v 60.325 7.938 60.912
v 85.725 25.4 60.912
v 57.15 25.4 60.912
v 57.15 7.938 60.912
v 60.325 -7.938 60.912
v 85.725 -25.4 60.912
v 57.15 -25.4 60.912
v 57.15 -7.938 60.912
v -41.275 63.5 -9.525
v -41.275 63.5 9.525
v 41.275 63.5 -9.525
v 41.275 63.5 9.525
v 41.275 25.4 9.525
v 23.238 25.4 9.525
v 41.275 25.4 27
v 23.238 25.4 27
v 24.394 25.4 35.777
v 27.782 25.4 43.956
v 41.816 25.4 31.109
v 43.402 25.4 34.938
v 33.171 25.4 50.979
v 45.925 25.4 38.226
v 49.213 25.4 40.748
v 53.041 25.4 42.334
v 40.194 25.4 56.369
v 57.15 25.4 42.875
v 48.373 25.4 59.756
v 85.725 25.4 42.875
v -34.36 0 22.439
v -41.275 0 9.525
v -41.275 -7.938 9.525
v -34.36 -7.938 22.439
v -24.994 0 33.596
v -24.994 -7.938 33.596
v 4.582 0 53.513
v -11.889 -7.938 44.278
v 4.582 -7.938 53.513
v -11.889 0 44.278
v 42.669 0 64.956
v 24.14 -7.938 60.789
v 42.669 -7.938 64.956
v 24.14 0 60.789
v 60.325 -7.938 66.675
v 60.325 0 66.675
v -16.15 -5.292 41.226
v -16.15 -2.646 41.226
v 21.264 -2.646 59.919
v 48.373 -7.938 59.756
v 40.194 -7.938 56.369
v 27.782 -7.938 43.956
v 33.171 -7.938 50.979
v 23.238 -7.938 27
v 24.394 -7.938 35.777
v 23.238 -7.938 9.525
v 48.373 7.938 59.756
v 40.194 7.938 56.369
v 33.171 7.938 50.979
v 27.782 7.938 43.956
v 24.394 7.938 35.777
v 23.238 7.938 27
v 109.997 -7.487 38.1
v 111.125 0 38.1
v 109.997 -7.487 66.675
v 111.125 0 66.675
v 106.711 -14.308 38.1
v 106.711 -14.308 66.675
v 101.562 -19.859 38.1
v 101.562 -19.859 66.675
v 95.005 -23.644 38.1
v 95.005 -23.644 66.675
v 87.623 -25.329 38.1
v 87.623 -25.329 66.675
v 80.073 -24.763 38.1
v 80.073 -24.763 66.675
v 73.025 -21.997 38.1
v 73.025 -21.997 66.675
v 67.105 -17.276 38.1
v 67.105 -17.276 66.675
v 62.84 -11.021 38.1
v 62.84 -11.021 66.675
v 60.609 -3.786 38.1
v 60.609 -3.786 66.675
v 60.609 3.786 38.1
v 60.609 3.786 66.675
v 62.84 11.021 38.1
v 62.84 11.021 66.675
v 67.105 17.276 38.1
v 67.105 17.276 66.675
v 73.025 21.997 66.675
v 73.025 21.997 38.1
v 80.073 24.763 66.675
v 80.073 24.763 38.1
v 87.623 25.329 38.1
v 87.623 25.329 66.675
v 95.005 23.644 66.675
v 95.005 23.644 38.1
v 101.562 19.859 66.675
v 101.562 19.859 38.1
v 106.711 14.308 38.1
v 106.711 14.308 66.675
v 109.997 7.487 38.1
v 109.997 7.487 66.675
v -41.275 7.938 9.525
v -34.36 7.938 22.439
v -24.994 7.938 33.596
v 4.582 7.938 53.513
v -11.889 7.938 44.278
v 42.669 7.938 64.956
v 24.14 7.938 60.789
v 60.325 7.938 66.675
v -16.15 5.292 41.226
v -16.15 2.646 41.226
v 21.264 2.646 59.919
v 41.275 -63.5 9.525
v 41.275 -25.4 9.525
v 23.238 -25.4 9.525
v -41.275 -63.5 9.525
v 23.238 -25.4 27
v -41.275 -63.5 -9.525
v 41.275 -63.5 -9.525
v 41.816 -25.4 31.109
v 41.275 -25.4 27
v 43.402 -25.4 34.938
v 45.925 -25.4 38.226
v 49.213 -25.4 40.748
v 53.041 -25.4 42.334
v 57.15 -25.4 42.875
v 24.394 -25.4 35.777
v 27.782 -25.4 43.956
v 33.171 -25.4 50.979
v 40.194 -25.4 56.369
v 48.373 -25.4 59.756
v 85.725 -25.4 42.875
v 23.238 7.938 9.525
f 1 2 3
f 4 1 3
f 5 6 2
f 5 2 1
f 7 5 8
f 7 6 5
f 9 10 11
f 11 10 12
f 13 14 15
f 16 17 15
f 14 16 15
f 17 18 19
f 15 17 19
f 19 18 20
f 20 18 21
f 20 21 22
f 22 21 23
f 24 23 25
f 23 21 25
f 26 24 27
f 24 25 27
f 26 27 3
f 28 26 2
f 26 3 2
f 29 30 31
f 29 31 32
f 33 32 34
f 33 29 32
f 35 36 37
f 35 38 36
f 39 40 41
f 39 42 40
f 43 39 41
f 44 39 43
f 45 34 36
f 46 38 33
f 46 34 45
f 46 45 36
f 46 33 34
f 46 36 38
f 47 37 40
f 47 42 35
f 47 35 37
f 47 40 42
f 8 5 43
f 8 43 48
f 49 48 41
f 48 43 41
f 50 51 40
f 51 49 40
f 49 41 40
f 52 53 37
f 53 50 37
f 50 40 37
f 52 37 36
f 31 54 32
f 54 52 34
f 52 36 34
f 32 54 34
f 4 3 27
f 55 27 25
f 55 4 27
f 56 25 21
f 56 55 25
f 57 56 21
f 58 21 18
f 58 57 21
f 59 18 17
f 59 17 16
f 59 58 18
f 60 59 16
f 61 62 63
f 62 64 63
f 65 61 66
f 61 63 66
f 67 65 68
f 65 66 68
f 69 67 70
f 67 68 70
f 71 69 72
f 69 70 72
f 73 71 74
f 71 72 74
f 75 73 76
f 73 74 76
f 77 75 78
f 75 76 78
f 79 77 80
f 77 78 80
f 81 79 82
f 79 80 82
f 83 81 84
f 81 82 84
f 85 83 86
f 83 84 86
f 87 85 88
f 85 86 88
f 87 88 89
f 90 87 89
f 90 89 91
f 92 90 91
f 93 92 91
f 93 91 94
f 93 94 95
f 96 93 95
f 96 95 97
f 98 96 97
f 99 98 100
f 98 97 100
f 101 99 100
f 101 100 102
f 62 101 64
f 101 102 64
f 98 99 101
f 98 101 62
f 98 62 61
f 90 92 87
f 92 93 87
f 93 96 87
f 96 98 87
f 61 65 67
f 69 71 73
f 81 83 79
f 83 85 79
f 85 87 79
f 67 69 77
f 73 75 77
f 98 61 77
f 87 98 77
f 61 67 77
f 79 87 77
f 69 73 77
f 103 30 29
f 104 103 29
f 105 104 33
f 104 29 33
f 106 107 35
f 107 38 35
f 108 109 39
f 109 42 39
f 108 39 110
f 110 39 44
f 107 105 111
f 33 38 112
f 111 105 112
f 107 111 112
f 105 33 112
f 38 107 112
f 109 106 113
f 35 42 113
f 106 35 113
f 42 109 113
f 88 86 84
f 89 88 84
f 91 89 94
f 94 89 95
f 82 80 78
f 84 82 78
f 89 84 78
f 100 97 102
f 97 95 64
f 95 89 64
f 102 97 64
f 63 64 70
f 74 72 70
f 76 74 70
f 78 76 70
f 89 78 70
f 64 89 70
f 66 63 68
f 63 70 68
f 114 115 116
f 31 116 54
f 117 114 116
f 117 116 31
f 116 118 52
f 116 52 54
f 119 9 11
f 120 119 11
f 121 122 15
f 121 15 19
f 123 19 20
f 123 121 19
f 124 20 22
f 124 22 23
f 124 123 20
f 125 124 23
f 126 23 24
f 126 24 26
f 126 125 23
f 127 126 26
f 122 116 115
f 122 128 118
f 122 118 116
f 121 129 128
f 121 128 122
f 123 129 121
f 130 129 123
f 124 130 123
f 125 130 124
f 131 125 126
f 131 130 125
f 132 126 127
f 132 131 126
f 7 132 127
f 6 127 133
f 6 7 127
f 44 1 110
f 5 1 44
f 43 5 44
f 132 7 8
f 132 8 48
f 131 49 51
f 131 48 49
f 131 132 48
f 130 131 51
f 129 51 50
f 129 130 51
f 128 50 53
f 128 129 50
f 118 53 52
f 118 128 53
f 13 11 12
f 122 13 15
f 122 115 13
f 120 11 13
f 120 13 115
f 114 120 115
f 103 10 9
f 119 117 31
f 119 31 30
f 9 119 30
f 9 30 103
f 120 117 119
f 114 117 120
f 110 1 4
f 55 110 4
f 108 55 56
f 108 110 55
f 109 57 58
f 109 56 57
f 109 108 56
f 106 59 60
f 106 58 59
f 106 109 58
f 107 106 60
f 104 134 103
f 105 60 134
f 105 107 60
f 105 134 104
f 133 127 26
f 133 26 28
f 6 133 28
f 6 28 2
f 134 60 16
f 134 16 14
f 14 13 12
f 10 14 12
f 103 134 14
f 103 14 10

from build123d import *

# Parameters (mm, degrees)
F1_DEPTH = 63.5
F3_DEPTH = 25.4
F4_DEPTH = 7.9375


# Not quite as in the source:
# - a feature names something its author has since deleted; it is built from what else it names


with BuildPart() as f1:
    # F0 (on Front) → F1 (new body, symmetric)
    with BuildSketch(Plane.XZ):
        Polygon((-41.275, -9.525), (41.275, -9.525), (41.275, 9.525), (23.2382267714, 9.525), (-41.275, 9.525), align=None)
    extrude(amount=F1_DEPTH, both=True)

    # F0 (on Front) → F3 (join, symmetric)
    with BuildSketch(Plane.XZ):
        with BuildLine():
            Line((23.2382267714, 9.525), (41.275, 9.525))
            Line((41.275, 9.525), (41.275, 27.0002))
            ThreePointArc((41.275, 27.0002), (45.9246798487, 38.2255201513), (57.15, 42.8752))
            Line((57.15, 42.8752), (60.325, 42.8752))
            Line((60.325, 42.8752), (85.725, 42.8752))
            Line((85.725, 42.8752), (85.725, 60.9119732286))
            Line((85.725, 60.9119732286), (60.325, 60.9119732286))
            Line((60.325, 60.9119732286), (57.15, 60.9119732286))
            ThreePointArc((57.15, 60.9119732286), (33.170755188, 50.979444812), (23.2382267714, 27.0002))
            Line((23.2382267714, 27.0002), (23.2382267714, 9.525))
        make_face()
    extrude(amount=F3_DEPTH, both=True)

    # F0 (on Front) → F4 (join, symmetric)
    with BuildSketch(Plane.XZ):
        with BuildLine():
            add(Edge.make_bspline(
                [(-41.275, 9.525), (-25.8415896149, 48.0881909513), (23.9874106138, 65.5300151641), (60.325, 66.675)],
                knots=[0, 0, 0, 0, 116.5705044169, 116.5705044169, 116.5705044169, 116.5705044169], degree=3))
            Line((-41.275, 9.525), (23.2382267714, 9.525))
            Line((23.2382267714, 9.525), (23.2382267714, 27.0002))
            ThreePointArc((23.2382267714, 27.0002), (33.170755188, 50.979444812), (57.15, 60.9119732286))
            Line((57.15, 60.9119732286), (60.325, 60.9119732286))
            Line((60.325, 60.9119732286), (60.325, 66.675))
        make_face()
    extrude(amount=F4_DEPTH, both=True)


with BuildPart() as f5:
    # F0 (on Front) → F5 (revolve)
    with BuildSketch(Plane.XZ):
        Polygon((111.125, 66.675), (85.725, 66.675), (85.725, 60.9119732286), (85.725, 42.8752), (85.725, 38.1), (111.125, 38.1), align=None)
    revolve(axis=Axis((85.725, 0, 52.3875), (0, 0, -1)))


solid = Compound([f1.part, f5.part])
